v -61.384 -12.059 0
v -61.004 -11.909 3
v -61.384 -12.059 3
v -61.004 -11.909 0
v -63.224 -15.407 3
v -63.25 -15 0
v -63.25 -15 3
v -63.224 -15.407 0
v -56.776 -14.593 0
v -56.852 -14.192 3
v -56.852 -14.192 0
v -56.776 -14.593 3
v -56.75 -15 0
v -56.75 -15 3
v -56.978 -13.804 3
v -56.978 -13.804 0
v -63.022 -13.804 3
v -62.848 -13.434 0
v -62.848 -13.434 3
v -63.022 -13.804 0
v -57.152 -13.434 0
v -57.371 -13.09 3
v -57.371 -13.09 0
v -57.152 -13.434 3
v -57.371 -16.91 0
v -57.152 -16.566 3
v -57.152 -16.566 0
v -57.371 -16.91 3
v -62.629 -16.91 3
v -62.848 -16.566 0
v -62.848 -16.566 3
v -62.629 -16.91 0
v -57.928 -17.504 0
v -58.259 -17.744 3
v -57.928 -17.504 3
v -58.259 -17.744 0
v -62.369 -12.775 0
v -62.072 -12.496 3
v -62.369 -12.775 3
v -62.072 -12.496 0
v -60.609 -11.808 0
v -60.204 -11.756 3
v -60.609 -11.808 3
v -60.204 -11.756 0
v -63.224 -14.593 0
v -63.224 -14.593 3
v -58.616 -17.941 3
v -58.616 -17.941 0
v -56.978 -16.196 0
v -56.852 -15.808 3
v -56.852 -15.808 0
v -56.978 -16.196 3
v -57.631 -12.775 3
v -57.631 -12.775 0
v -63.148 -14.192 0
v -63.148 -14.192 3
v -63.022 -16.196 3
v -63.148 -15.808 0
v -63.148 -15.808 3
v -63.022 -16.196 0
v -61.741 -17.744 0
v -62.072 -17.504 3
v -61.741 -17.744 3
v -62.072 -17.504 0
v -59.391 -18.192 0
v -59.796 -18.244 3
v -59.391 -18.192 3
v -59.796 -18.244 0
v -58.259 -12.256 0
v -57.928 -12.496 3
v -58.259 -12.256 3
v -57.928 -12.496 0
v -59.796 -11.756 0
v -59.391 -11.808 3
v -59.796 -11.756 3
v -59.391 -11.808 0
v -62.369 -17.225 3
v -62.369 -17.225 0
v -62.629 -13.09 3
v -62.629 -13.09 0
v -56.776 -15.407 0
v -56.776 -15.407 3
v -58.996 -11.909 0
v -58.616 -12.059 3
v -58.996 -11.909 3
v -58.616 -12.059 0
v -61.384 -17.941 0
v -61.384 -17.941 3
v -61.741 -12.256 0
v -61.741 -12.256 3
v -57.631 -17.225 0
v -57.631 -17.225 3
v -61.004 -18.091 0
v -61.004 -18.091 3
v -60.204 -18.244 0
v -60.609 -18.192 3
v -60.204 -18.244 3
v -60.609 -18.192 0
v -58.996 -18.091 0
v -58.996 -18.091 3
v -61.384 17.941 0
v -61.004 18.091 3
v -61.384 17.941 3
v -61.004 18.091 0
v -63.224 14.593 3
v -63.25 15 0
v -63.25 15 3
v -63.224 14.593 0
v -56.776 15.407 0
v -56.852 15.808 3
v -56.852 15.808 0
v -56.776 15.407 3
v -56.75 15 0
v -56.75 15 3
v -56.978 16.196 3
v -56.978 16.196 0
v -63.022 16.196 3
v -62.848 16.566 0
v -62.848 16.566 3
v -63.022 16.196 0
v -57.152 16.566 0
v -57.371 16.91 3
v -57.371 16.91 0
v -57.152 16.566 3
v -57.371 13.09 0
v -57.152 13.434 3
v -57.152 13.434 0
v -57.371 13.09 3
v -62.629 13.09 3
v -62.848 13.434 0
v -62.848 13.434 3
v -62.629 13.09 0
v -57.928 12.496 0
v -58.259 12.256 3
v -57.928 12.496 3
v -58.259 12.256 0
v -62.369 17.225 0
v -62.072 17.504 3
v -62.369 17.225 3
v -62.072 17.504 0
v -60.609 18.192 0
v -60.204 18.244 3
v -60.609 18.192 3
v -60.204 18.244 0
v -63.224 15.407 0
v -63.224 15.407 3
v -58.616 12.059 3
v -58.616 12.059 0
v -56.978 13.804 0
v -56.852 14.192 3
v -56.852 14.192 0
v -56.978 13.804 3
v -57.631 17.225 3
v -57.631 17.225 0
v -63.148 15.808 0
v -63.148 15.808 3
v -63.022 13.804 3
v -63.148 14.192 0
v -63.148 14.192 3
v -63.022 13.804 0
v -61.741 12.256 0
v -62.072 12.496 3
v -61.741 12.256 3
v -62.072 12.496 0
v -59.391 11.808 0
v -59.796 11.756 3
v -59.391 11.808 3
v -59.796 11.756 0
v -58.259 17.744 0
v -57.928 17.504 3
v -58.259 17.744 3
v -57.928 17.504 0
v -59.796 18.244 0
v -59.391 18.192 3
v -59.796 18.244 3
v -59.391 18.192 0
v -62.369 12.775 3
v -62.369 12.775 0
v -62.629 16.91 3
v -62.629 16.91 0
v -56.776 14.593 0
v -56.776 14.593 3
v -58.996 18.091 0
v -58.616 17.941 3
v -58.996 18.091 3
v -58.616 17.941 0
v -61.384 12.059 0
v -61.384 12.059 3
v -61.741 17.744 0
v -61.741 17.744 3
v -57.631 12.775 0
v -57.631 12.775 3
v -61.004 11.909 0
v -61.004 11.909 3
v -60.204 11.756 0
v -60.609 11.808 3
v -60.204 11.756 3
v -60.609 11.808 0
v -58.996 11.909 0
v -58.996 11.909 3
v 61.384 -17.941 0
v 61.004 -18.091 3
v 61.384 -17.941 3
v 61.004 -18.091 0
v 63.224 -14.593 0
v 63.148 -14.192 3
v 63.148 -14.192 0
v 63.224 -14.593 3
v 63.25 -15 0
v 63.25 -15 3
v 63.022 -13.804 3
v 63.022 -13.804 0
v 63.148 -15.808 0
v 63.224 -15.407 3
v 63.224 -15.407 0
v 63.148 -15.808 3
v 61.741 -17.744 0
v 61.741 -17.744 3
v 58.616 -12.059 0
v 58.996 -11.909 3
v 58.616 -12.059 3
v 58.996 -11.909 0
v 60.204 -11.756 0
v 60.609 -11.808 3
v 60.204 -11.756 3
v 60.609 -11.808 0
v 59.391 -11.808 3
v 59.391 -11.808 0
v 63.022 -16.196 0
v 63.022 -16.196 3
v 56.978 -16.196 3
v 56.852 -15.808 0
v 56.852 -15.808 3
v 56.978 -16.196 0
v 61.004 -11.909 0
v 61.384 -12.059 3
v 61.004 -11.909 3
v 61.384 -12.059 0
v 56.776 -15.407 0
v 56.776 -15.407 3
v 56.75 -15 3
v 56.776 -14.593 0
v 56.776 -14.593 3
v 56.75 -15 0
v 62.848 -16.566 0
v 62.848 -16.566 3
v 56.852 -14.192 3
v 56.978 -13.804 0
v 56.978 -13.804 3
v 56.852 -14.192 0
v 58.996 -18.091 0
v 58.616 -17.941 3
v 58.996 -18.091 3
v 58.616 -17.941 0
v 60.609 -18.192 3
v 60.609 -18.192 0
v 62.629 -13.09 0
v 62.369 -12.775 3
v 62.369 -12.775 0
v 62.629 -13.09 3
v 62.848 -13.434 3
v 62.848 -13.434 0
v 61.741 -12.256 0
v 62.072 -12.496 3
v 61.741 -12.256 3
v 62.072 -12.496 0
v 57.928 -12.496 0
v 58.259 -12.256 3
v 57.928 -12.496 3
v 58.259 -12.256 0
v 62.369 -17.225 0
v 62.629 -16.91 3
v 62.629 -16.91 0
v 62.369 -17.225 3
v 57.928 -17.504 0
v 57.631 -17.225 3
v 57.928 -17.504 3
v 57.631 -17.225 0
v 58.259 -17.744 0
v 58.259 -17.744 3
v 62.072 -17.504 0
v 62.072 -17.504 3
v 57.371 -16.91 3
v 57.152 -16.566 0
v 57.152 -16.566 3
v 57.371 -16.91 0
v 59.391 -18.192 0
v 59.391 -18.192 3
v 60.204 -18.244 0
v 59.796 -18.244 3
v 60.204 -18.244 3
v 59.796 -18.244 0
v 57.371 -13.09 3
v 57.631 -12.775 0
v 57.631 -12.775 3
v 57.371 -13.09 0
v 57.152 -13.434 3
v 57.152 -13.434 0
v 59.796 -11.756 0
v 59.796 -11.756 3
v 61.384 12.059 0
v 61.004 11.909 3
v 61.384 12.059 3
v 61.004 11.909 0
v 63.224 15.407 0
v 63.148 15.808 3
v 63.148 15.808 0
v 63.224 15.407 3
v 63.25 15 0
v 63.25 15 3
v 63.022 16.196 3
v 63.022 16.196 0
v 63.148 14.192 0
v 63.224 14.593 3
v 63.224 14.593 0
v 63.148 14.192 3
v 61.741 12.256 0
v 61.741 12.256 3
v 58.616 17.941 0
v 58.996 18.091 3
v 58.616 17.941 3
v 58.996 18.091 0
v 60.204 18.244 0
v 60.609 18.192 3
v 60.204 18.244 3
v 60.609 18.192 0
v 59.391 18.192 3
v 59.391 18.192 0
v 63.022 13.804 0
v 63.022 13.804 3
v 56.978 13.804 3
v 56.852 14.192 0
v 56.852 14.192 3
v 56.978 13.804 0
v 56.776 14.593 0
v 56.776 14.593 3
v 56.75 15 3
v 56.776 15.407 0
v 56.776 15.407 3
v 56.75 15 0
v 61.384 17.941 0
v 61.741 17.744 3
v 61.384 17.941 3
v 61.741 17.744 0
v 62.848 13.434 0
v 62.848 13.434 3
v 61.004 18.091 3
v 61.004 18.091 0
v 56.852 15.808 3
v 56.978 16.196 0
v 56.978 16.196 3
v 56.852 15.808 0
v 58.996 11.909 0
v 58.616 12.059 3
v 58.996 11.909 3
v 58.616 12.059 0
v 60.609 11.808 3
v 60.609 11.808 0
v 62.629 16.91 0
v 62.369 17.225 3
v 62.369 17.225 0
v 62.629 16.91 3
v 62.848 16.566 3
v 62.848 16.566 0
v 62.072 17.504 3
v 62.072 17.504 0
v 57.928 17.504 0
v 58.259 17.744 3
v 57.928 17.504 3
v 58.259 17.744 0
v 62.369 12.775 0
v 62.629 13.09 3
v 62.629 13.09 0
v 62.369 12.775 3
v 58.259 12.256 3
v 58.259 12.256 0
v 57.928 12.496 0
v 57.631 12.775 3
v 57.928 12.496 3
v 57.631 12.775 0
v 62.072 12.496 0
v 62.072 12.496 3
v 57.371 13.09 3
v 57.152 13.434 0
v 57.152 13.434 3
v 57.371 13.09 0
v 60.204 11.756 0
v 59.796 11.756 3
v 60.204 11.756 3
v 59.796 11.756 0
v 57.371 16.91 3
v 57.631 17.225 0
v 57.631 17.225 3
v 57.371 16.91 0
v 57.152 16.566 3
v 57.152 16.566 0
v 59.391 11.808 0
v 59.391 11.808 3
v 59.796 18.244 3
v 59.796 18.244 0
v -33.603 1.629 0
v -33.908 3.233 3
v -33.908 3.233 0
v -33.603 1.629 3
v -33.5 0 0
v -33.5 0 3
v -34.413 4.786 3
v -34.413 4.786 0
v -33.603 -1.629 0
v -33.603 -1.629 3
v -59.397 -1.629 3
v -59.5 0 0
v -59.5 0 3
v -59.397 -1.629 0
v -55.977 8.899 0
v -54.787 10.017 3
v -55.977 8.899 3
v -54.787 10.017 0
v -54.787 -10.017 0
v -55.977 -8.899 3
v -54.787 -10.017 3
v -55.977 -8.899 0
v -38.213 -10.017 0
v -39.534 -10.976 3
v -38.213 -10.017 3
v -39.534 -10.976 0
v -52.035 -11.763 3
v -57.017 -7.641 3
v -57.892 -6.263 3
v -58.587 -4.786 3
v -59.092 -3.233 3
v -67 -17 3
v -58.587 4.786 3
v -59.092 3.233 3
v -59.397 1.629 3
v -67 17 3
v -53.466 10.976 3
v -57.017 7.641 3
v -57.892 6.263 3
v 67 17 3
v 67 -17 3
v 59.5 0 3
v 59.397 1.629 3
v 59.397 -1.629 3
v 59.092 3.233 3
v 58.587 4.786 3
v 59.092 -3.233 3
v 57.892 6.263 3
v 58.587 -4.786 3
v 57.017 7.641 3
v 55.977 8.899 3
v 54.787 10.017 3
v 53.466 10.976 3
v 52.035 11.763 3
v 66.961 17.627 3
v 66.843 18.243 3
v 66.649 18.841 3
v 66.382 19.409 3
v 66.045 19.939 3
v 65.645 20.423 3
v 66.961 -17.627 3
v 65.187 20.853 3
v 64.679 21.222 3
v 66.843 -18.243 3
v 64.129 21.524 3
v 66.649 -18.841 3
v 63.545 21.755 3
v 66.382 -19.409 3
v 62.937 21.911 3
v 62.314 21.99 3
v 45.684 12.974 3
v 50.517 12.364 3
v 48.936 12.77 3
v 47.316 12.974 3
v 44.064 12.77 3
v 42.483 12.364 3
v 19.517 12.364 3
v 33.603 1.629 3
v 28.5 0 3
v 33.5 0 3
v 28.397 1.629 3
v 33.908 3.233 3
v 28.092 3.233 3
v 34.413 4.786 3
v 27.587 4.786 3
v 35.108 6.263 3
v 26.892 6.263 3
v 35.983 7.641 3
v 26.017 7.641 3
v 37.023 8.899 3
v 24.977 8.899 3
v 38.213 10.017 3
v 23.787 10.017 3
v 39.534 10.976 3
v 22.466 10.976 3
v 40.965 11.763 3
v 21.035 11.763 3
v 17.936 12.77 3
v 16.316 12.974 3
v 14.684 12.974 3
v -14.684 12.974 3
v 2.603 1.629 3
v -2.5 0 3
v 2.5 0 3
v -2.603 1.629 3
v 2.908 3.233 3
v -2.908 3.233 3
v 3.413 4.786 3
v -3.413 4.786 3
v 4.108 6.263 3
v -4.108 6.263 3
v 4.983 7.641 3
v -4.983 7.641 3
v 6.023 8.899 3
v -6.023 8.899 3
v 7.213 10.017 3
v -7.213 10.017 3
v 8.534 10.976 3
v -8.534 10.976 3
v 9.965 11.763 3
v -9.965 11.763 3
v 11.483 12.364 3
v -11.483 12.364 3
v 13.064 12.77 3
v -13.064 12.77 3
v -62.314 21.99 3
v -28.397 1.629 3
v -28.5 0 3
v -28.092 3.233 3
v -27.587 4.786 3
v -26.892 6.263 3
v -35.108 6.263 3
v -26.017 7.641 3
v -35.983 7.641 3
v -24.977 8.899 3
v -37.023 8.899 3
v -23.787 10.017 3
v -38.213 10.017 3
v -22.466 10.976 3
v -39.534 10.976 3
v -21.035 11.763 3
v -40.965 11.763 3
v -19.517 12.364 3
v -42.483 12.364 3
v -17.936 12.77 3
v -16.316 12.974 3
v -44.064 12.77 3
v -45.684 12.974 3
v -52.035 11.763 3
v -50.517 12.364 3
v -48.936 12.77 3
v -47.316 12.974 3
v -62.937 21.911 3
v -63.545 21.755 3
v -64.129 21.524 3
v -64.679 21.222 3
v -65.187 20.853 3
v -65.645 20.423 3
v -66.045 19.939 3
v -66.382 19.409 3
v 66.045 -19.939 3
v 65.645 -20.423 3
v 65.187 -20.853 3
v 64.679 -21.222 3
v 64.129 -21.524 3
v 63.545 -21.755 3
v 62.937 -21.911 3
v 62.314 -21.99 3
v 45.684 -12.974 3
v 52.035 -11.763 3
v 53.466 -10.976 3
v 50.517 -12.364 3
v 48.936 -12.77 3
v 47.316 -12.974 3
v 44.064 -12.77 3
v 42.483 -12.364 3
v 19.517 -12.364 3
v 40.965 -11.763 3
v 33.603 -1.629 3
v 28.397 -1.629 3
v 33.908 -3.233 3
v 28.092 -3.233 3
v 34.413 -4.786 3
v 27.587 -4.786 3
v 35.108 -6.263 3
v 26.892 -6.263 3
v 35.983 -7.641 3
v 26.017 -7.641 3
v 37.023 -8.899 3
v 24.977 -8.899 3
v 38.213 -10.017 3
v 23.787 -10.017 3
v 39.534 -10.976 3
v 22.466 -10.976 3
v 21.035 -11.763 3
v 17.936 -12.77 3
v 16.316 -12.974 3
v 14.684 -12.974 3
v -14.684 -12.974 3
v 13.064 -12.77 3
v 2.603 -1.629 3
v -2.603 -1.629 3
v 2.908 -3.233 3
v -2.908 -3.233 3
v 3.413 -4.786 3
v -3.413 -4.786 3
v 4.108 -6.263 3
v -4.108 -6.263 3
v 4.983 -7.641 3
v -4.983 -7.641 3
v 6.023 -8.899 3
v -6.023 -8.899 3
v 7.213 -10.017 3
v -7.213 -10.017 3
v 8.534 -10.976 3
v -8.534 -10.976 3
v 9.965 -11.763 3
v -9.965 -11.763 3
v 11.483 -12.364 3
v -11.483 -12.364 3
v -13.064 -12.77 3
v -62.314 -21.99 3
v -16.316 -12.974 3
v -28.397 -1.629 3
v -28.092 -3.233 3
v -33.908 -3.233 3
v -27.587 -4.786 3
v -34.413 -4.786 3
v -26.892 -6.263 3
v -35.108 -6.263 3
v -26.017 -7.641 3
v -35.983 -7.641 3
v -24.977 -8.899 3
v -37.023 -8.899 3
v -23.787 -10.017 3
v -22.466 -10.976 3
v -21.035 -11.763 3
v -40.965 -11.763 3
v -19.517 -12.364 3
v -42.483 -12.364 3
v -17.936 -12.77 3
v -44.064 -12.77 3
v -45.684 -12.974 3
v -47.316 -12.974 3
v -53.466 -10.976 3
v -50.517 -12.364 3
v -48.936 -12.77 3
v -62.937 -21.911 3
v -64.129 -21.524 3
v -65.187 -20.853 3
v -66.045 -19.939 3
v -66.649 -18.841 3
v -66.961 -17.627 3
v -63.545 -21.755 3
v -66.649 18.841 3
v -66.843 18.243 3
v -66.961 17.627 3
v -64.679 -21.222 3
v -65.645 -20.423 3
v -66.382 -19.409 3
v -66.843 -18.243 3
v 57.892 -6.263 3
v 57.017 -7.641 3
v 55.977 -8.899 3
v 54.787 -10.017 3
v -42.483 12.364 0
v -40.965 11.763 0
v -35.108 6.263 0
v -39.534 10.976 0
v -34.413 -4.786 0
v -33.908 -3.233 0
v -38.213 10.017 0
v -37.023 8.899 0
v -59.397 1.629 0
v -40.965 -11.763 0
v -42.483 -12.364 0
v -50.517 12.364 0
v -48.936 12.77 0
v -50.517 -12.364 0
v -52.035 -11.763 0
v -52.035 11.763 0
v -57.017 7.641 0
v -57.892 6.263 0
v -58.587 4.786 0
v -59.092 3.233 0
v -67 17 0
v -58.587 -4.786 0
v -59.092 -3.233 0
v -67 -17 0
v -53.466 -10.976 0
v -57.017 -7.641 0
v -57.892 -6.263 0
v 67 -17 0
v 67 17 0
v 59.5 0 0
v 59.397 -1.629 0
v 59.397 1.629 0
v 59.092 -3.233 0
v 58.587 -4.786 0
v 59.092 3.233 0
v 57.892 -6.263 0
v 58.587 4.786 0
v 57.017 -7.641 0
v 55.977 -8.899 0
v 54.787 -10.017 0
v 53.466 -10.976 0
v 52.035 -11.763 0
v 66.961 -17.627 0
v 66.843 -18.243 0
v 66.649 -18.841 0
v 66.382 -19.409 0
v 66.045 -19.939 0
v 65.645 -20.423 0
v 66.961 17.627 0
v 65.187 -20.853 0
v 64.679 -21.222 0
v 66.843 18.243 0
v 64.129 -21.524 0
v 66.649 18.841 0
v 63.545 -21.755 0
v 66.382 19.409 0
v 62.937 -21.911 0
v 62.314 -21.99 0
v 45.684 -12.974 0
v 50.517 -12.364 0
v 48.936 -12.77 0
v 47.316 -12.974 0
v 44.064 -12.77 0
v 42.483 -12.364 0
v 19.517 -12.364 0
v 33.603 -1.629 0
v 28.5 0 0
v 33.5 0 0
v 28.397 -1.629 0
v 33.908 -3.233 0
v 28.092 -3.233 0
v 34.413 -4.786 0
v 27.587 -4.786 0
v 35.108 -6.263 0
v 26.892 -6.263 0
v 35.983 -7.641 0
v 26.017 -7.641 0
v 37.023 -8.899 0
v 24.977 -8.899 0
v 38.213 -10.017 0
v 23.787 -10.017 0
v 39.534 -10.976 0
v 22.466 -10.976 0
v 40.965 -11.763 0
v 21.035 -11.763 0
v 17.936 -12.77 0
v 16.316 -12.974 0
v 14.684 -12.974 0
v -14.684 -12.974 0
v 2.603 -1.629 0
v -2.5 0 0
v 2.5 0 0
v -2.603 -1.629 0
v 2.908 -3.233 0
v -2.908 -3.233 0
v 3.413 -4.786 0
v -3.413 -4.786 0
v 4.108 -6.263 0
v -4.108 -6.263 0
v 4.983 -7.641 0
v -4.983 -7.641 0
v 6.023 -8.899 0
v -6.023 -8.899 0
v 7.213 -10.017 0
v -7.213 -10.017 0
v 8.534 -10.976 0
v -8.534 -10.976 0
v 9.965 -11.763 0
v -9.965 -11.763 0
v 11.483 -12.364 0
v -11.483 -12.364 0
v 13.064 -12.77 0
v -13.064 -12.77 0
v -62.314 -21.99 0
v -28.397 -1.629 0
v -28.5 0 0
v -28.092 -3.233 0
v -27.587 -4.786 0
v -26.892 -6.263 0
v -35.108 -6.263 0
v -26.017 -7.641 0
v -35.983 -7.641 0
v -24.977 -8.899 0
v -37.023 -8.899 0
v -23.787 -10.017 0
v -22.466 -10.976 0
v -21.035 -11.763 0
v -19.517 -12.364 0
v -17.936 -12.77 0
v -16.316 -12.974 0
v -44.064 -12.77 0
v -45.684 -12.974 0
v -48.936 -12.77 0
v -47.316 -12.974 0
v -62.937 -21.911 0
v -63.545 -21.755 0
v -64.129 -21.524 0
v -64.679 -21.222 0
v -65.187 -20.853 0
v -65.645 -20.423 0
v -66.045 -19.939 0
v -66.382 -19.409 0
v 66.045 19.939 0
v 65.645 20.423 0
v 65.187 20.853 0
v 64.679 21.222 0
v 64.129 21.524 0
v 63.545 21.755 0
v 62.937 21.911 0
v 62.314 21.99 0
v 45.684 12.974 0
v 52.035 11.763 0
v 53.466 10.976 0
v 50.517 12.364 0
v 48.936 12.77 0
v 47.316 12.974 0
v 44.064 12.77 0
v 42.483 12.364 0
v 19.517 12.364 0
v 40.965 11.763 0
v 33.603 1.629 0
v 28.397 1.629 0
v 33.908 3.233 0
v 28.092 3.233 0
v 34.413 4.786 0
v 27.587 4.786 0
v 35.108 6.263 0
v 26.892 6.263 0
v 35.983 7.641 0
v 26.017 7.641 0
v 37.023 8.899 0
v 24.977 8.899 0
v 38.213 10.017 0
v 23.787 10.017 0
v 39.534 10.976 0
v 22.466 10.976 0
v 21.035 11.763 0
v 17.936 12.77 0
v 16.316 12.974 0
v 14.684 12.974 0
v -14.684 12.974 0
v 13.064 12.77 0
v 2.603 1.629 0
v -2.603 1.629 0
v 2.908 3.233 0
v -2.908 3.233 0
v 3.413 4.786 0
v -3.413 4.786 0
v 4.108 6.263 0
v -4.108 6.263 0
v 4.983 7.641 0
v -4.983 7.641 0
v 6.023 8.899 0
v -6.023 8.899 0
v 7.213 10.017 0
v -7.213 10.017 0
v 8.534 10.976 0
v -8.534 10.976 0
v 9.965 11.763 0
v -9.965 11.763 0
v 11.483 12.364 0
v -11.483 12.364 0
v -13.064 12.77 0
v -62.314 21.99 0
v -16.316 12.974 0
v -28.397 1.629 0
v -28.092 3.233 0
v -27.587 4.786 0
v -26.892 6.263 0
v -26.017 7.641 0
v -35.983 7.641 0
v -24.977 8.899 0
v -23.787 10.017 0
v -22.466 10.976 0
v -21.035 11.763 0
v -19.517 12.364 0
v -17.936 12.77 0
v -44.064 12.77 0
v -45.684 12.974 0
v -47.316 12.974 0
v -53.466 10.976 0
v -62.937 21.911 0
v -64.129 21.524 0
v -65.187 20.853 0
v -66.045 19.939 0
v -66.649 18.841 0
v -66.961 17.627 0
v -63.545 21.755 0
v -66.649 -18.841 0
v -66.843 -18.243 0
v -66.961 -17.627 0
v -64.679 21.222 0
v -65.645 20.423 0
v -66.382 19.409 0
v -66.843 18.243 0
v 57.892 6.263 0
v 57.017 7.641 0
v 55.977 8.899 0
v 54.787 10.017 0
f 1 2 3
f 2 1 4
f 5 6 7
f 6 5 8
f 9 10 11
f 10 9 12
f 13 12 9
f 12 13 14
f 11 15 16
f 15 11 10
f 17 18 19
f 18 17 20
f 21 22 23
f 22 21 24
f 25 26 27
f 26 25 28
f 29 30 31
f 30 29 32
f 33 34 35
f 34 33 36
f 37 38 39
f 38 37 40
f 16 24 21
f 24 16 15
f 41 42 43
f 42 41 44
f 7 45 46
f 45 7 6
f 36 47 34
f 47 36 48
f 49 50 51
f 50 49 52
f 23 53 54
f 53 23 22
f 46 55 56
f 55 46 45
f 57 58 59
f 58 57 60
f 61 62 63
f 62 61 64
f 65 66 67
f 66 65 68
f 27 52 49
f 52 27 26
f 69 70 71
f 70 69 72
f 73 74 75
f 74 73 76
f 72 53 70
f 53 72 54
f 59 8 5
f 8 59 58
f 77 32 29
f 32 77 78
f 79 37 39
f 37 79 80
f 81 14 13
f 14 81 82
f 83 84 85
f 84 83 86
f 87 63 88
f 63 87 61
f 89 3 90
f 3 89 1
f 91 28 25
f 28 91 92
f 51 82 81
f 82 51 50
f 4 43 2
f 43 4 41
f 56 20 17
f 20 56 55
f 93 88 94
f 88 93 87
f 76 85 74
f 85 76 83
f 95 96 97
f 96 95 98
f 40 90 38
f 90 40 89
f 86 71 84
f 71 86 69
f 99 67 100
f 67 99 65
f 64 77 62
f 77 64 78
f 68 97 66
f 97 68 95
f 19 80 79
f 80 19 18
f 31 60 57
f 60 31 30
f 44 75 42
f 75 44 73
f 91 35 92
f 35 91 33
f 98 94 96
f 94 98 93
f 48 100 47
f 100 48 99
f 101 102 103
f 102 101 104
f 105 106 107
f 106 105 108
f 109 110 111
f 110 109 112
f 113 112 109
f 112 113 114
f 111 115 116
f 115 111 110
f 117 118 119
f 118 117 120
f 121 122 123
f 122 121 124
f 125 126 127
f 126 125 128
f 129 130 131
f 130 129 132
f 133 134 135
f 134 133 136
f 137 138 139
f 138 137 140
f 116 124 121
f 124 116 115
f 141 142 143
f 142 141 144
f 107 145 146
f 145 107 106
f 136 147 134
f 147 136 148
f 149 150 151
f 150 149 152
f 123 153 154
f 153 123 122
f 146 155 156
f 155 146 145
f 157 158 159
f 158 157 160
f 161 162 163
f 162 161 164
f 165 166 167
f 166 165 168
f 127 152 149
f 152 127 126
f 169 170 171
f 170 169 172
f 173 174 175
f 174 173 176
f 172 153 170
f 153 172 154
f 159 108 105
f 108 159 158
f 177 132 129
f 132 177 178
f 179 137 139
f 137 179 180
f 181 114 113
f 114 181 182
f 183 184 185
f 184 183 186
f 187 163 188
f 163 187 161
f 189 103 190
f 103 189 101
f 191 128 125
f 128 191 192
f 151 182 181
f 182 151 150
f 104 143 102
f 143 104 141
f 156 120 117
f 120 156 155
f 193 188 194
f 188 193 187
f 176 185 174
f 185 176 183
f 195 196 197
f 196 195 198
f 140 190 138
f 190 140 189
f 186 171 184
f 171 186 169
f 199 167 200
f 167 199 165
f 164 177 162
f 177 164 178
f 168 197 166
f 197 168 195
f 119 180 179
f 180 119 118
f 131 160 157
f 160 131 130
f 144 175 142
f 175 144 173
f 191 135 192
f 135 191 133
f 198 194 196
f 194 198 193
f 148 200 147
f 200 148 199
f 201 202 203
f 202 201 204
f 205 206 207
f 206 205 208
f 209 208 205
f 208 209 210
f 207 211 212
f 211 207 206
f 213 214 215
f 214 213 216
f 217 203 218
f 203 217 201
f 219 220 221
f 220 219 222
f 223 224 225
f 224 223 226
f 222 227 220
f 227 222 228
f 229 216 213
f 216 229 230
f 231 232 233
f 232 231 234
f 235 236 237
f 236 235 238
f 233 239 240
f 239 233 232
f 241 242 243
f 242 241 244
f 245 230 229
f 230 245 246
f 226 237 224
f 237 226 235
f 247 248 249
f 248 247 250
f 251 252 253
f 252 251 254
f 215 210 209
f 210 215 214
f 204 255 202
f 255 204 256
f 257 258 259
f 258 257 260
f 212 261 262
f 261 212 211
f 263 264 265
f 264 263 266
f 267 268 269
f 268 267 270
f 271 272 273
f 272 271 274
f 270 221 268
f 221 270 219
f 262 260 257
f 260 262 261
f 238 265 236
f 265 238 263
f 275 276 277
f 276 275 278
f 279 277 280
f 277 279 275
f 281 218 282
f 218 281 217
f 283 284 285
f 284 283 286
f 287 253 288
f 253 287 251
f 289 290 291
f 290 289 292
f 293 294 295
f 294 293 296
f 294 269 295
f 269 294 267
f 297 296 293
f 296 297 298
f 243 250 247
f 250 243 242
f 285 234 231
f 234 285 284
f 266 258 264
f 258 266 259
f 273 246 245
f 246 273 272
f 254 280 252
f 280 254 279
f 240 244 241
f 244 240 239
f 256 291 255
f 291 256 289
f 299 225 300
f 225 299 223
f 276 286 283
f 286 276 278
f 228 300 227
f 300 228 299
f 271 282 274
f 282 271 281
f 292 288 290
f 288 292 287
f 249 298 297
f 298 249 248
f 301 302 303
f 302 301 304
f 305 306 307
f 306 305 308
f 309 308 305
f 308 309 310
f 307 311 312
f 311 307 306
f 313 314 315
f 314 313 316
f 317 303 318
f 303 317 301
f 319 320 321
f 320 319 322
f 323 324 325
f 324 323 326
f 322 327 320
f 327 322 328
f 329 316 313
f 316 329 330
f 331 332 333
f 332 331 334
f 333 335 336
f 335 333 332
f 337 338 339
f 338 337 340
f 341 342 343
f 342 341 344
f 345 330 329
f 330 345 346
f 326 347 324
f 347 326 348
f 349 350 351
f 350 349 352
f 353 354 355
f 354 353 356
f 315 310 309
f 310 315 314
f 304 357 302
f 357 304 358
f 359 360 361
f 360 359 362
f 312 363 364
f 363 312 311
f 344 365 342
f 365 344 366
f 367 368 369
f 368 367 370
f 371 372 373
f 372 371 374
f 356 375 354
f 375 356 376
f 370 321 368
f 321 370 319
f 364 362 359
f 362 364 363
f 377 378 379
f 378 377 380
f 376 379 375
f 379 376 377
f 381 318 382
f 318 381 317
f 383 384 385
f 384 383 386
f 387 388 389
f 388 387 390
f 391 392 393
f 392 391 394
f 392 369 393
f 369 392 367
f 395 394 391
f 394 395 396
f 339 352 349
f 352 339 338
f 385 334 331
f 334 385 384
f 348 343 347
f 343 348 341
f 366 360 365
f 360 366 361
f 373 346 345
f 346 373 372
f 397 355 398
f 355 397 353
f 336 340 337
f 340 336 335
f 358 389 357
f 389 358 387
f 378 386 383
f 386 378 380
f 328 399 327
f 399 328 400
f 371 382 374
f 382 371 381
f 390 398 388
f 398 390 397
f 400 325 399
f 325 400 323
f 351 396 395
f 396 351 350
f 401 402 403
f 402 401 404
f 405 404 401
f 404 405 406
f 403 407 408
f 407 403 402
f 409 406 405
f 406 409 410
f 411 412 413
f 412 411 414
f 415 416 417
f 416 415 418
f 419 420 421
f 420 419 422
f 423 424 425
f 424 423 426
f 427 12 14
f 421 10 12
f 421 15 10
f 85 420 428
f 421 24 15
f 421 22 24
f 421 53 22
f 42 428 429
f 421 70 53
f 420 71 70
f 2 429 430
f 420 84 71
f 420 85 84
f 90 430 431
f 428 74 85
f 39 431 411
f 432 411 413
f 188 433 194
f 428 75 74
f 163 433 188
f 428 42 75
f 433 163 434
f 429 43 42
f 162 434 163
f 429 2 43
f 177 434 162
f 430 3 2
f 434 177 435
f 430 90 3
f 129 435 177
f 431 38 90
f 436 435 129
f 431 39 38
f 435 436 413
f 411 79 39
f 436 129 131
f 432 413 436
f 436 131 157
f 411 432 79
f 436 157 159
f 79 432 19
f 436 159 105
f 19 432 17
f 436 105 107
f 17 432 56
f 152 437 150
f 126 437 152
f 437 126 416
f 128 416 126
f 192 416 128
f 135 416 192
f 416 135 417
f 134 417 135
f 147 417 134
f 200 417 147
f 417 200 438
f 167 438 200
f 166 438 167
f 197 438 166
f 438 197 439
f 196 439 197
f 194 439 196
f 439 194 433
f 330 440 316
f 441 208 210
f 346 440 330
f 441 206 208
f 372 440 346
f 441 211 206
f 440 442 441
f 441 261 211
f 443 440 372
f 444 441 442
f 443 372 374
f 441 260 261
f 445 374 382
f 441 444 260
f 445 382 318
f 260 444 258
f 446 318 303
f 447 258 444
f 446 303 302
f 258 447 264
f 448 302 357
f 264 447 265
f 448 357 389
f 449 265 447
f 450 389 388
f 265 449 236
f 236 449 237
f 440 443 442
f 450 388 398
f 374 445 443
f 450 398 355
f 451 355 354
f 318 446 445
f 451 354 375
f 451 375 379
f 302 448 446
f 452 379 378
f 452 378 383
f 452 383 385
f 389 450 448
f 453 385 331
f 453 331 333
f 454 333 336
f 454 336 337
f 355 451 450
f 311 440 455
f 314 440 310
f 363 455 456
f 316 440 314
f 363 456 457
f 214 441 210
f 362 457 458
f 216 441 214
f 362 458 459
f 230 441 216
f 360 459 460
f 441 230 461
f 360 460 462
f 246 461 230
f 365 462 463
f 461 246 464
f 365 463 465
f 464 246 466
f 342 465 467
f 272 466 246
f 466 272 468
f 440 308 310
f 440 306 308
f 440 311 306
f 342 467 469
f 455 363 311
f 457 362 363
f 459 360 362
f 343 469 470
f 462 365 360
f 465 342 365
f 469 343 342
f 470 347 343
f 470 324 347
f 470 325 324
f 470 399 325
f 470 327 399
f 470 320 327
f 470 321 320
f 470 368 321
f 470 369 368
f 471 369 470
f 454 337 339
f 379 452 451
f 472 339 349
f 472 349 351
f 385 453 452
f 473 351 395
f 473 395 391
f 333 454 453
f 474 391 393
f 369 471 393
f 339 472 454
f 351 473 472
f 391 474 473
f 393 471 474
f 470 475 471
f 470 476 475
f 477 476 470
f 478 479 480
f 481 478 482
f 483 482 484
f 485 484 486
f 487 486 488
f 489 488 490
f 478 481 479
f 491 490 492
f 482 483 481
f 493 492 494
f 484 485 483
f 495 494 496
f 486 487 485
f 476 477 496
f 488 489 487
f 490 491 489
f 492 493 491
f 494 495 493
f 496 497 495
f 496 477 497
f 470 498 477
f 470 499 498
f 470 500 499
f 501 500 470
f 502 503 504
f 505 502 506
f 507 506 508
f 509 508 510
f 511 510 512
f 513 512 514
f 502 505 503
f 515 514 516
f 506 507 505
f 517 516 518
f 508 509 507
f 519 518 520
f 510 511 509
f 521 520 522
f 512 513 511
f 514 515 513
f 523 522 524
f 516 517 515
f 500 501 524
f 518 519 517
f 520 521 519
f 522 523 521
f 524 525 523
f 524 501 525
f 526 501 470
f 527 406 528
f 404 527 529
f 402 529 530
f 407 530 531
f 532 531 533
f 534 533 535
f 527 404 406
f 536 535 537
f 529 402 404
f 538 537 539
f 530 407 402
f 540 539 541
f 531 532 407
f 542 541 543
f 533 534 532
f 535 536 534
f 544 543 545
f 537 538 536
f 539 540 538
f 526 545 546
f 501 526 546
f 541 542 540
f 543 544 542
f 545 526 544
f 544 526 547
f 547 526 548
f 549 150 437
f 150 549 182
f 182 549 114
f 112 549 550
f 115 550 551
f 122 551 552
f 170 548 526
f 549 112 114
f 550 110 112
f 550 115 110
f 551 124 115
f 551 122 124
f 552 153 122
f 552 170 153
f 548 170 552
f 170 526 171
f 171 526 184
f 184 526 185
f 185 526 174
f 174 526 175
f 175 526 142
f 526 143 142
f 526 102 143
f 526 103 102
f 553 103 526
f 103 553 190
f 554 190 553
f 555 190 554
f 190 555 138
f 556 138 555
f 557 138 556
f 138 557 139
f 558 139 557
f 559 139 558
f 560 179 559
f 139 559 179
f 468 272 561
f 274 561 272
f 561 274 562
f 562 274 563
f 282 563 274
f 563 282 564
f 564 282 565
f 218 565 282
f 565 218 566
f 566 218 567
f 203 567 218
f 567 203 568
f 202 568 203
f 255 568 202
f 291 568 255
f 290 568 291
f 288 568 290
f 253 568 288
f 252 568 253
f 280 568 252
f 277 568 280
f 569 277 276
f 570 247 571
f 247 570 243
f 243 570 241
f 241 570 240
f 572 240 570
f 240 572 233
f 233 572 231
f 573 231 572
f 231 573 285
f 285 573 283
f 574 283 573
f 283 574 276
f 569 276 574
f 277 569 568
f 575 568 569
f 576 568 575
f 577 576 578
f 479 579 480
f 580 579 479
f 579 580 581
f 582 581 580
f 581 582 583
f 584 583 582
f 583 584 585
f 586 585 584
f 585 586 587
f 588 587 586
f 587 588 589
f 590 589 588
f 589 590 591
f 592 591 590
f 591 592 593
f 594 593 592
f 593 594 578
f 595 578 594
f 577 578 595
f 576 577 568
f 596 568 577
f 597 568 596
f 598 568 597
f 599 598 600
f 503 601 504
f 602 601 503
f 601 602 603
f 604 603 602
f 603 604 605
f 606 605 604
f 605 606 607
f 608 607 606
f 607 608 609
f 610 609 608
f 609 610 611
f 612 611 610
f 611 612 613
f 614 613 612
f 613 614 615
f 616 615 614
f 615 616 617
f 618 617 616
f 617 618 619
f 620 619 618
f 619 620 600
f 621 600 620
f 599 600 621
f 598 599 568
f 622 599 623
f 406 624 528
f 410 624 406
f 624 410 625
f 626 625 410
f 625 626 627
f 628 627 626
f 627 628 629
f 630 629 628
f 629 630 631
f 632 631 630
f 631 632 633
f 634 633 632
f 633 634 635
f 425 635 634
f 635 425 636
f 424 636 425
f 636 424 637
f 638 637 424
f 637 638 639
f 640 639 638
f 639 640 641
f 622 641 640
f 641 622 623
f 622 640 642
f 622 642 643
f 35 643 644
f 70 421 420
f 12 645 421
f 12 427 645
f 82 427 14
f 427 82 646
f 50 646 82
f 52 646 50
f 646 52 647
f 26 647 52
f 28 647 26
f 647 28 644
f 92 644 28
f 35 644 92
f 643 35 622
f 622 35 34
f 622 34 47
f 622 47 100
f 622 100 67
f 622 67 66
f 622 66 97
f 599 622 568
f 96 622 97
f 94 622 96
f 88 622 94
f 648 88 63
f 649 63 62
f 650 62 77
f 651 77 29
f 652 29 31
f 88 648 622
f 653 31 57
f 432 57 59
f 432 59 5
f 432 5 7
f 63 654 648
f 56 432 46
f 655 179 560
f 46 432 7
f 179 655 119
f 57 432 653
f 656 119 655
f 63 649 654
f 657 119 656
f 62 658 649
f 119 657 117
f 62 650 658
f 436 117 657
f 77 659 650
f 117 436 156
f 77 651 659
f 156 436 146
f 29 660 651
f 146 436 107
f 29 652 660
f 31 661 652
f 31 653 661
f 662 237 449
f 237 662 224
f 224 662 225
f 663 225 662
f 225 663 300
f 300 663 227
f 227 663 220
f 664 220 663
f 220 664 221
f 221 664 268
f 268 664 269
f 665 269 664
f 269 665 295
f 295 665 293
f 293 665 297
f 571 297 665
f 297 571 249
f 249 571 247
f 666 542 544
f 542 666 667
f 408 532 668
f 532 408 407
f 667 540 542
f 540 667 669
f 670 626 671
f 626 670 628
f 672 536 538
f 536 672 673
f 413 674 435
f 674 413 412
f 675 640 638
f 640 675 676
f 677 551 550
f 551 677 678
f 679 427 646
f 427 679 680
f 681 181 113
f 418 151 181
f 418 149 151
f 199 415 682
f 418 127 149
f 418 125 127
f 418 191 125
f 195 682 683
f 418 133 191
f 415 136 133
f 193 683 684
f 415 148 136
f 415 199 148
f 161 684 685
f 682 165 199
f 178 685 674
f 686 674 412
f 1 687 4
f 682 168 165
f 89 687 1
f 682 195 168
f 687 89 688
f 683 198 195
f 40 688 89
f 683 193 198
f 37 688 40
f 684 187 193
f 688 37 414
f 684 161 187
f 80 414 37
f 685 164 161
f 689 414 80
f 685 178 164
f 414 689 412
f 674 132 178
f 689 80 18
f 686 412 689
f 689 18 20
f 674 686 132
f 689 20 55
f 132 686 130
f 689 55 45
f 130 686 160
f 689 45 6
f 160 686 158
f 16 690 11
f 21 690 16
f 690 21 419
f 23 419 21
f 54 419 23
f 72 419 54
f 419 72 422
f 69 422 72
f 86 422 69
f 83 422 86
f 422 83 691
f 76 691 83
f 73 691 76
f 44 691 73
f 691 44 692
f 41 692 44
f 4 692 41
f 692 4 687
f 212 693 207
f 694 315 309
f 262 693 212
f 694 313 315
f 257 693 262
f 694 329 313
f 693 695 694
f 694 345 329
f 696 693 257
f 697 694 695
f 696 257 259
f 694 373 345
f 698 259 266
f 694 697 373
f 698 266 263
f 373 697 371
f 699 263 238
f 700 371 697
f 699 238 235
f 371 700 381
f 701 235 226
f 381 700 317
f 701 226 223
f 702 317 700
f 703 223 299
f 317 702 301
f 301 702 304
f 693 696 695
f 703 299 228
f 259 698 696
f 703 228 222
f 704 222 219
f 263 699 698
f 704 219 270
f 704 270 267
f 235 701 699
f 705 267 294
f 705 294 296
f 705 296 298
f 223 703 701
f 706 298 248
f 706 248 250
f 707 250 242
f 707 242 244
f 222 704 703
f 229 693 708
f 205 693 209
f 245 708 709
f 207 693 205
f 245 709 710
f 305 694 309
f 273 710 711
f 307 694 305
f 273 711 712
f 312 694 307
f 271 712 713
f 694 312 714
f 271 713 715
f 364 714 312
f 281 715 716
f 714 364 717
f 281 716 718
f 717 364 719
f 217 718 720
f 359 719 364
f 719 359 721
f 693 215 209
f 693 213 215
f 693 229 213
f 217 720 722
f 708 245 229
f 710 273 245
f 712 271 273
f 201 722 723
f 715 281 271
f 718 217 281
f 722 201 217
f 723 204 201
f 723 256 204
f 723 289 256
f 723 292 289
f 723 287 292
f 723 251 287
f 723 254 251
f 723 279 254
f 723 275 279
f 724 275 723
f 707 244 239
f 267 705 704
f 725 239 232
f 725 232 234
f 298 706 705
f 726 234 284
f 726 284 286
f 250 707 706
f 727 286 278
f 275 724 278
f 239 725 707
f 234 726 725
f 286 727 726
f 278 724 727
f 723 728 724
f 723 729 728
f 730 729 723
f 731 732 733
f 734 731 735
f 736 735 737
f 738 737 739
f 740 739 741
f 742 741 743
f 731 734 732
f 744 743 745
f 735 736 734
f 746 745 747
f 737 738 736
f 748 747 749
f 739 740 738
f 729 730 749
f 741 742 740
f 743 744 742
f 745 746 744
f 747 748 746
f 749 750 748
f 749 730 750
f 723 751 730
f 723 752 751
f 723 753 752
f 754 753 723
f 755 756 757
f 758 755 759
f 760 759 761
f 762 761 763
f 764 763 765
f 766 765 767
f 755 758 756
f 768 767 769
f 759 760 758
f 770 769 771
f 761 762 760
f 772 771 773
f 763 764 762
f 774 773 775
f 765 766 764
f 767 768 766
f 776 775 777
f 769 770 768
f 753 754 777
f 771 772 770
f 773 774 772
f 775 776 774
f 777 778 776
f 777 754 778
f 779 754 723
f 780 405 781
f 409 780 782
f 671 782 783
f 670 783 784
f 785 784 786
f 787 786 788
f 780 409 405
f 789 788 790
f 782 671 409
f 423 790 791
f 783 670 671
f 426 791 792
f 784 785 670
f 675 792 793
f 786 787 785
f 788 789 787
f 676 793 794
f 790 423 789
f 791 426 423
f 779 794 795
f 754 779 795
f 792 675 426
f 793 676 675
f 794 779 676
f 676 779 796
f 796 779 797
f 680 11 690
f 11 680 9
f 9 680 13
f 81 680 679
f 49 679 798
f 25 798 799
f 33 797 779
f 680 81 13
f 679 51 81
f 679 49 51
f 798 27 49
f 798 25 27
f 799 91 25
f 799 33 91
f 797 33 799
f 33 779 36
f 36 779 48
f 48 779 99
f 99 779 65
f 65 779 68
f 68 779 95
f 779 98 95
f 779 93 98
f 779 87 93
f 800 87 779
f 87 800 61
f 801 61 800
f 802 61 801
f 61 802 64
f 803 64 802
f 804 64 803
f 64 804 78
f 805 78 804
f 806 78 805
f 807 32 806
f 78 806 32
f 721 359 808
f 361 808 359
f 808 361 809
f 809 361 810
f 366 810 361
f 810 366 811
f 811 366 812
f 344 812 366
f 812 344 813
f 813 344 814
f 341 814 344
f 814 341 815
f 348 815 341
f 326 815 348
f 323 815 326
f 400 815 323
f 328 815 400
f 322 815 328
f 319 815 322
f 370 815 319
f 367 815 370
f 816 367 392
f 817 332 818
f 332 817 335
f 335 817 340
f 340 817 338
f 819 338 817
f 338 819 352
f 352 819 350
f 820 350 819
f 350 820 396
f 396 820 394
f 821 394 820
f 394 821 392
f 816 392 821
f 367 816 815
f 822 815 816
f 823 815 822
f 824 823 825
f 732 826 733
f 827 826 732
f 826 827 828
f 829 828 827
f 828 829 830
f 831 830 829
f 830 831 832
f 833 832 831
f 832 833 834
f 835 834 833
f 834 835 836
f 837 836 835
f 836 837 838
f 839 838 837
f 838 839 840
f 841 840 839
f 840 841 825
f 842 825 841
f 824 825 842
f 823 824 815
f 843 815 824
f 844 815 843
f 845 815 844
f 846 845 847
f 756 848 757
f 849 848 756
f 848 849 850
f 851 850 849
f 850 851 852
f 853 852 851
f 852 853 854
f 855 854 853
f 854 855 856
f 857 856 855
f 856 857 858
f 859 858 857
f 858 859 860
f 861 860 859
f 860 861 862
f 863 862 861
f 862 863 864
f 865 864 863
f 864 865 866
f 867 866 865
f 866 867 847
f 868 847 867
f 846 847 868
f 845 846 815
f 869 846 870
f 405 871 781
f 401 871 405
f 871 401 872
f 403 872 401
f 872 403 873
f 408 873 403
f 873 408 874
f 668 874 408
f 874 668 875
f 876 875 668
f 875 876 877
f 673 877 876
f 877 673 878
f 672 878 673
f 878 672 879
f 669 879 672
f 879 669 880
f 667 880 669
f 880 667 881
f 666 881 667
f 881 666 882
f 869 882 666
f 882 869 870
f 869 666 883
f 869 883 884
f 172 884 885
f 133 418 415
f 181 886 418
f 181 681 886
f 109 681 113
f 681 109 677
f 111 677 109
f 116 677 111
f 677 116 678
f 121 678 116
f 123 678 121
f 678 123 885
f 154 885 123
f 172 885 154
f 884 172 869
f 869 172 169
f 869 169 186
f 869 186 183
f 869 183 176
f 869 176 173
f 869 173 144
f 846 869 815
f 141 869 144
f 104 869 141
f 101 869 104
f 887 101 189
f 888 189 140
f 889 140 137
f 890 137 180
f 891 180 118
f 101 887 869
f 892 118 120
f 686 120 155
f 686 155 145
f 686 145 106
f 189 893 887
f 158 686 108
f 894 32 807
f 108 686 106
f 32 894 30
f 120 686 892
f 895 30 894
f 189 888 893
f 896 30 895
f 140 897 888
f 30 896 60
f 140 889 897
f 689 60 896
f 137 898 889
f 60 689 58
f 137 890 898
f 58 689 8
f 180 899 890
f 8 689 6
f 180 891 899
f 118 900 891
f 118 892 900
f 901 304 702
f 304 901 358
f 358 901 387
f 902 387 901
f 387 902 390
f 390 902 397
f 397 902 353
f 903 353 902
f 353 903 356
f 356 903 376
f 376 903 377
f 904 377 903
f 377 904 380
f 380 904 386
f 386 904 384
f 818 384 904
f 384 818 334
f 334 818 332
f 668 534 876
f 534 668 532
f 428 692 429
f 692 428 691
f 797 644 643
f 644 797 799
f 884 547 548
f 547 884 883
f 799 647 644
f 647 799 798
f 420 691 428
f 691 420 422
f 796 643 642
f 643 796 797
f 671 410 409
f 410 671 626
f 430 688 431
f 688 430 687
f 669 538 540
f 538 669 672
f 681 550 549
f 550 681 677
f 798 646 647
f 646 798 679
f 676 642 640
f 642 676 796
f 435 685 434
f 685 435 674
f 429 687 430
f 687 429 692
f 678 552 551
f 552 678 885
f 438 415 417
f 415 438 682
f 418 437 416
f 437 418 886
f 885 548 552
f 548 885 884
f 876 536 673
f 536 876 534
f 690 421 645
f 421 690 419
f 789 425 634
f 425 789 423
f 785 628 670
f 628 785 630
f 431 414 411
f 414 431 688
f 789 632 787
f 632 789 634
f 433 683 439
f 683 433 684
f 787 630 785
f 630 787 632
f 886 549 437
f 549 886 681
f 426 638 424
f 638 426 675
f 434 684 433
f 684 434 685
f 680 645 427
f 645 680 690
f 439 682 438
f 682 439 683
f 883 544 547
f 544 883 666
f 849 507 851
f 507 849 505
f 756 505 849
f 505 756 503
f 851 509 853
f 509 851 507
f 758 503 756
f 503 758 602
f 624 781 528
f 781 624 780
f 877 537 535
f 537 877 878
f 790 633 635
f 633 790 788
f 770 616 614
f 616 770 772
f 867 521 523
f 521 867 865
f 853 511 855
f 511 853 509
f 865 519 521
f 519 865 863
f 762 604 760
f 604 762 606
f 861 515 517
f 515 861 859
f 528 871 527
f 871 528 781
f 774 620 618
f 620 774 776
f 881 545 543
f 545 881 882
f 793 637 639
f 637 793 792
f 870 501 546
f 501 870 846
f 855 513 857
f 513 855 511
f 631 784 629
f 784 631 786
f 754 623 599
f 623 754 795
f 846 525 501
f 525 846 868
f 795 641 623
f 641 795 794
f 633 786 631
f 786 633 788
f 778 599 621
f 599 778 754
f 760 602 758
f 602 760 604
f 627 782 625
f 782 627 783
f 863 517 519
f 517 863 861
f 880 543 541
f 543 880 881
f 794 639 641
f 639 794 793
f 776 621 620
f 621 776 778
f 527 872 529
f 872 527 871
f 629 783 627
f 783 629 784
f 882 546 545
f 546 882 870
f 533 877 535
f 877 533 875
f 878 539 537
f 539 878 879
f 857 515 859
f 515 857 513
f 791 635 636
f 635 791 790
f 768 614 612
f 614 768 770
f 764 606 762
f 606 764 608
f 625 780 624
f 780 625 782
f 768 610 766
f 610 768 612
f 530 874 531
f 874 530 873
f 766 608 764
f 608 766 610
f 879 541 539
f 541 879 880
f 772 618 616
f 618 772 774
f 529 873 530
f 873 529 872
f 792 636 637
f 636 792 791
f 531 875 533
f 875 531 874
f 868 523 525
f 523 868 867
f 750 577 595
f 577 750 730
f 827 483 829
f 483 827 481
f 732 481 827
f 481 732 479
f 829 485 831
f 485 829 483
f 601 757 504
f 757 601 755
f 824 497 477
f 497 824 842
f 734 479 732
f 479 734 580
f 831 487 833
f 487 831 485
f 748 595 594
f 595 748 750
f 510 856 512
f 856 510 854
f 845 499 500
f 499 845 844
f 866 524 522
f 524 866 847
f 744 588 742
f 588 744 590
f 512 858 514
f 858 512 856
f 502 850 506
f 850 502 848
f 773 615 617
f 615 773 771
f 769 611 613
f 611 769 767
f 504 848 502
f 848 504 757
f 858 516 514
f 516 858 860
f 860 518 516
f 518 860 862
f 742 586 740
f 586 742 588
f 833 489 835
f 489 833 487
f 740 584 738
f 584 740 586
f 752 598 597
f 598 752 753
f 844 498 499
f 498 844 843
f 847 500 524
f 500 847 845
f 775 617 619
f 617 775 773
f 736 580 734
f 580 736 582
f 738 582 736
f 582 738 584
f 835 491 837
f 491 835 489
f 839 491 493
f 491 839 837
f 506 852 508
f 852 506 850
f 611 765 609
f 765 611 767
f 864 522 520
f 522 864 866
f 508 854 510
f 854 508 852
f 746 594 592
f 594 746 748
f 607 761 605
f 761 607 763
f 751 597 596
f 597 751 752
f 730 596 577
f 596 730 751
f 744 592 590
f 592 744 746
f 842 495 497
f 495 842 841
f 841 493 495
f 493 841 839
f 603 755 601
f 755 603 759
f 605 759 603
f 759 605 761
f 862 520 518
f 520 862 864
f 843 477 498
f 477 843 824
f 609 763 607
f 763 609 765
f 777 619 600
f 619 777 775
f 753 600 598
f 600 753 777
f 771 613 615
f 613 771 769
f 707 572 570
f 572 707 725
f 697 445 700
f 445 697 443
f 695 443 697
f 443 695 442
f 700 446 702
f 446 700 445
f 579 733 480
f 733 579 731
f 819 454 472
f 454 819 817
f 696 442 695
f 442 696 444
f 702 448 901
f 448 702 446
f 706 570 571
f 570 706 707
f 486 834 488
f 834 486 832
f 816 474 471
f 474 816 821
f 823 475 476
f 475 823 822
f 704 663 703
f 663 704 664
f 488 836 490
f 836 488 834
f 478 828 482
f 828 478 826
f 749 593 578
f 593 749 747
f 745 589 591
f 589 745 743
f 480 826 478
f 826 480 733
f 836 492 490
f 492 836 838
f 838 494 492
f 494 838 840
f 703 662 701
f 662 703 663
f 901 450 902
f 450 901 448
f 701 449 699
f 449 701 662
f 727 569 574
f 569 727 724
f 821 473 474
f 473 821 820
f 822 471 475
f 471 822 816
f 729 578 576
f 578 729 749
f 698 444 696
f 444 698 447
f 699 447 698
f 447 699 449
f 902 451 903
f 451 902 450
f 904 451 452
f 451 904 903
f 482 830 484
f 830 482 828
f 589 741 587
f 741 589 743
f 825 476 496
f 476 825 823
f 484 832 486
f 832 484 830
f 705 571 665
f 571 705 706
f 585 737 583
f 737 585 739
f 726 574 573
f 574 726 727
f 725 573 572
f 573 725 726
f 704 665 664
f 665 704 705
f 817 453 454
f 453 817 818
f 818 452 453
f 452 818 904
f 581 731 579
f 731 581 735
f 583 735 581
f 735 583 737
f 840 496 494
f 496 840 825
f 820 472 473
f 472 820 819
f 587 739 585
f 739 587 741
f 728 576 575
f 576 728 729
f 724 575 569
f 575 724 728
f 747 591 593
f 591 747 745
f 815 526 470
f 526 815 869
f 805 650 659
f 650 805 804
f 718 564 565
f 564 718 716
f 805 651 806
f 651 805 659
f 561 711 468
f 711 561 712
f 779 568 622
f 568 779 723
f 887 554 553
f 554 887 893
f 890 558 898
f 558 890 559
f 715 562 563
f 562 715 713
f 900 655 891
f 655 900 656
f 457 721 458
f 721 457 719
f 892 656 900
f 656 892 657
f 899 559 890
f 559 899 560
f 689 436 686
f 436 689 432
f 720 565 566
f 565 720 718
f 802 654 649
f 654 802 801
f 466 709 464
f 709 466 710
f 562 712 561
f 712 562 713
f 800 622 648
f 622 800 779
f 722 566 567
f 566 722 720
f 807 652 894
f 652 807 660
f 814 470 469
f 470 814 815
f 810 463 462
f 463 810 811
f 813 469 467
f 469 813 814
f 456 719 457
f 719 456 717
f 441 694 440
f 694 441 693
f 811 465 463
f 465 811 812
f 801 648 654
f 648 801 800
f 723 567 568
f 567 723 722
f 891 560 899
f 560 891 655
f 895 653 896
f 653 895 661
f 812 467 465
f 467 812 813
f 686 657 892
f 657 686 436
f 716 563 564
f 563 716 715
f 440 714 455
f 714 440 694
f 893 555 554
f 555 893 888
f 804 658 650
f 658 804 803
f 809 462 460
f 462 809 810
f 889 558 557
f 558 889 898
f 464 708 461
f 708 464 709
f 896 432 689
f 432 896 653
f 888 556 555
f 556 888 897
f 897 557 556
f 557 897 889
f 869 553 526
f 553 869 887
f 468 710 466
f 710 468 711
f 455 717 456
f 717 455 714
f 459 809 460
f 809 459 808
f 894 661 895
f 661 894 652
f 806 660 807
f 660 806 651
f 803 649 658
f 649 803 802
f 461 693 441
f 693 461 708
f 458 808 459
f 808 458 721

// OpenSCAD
$fn = 50;


difference() {
	union() {
		hull() {
			translate(v = [-62.0000000000, 17.0000000000, 0]) {
				cylinder(h = 3, r = 5);
			}
			translate(v = [62.0000000000, 17.0000000000, 0]) {
				cylinder(h = 3, r = 5);
			}
			translate(v = [-62.0000000000, -17.0000000000, 0]) {
				cylinder(h = 3, r = 5);
			}
			translate(v = [62.0000000000, -17.0000000000, 0]) {
				cylinder(h = 3, r = 5);
			}
		}
	}
	union() {
		#translate(v = [-60.0000000000, -15.0000000000, -100.0000000000]) {
			cylinder(h = 200, r = 3.2500000000);
		}
		#translate(v = [-60.0000000000, 15.0000000000, -100.0000000000]) {
			cylinder(h = 200, r = 3.2500000000);
		}
		#translate(v = [60.0000000000, -15.0000000000, -100.0000000000]) {
			cylinder(h = 200, r = 3.2500000000);
		}
		#translate(v = [60.0000000000, 15.0000000000, -100.0000000000]) {
			cylinder(h = 200, r = 3.2500000000);
		}
		#translate(v = [-46.5000000000, 0, 0]) {
			cylinder(h = 3, r = 13.0000000000);
		}
		#translate(v = [-15.5000000000, 0, 0]) {
			cylinder(h = 3, r = 13.0000000000);
		}
		#translate(v = [15.5000000000, 0, 0]) {
			cylinder(h = 3, r = 13.0000000000);
		}
		#translate(v = [46.5000000000, 0, 0]) {
			cylinder(h = 3, r = 13.0000000000);
		}
	}
}
